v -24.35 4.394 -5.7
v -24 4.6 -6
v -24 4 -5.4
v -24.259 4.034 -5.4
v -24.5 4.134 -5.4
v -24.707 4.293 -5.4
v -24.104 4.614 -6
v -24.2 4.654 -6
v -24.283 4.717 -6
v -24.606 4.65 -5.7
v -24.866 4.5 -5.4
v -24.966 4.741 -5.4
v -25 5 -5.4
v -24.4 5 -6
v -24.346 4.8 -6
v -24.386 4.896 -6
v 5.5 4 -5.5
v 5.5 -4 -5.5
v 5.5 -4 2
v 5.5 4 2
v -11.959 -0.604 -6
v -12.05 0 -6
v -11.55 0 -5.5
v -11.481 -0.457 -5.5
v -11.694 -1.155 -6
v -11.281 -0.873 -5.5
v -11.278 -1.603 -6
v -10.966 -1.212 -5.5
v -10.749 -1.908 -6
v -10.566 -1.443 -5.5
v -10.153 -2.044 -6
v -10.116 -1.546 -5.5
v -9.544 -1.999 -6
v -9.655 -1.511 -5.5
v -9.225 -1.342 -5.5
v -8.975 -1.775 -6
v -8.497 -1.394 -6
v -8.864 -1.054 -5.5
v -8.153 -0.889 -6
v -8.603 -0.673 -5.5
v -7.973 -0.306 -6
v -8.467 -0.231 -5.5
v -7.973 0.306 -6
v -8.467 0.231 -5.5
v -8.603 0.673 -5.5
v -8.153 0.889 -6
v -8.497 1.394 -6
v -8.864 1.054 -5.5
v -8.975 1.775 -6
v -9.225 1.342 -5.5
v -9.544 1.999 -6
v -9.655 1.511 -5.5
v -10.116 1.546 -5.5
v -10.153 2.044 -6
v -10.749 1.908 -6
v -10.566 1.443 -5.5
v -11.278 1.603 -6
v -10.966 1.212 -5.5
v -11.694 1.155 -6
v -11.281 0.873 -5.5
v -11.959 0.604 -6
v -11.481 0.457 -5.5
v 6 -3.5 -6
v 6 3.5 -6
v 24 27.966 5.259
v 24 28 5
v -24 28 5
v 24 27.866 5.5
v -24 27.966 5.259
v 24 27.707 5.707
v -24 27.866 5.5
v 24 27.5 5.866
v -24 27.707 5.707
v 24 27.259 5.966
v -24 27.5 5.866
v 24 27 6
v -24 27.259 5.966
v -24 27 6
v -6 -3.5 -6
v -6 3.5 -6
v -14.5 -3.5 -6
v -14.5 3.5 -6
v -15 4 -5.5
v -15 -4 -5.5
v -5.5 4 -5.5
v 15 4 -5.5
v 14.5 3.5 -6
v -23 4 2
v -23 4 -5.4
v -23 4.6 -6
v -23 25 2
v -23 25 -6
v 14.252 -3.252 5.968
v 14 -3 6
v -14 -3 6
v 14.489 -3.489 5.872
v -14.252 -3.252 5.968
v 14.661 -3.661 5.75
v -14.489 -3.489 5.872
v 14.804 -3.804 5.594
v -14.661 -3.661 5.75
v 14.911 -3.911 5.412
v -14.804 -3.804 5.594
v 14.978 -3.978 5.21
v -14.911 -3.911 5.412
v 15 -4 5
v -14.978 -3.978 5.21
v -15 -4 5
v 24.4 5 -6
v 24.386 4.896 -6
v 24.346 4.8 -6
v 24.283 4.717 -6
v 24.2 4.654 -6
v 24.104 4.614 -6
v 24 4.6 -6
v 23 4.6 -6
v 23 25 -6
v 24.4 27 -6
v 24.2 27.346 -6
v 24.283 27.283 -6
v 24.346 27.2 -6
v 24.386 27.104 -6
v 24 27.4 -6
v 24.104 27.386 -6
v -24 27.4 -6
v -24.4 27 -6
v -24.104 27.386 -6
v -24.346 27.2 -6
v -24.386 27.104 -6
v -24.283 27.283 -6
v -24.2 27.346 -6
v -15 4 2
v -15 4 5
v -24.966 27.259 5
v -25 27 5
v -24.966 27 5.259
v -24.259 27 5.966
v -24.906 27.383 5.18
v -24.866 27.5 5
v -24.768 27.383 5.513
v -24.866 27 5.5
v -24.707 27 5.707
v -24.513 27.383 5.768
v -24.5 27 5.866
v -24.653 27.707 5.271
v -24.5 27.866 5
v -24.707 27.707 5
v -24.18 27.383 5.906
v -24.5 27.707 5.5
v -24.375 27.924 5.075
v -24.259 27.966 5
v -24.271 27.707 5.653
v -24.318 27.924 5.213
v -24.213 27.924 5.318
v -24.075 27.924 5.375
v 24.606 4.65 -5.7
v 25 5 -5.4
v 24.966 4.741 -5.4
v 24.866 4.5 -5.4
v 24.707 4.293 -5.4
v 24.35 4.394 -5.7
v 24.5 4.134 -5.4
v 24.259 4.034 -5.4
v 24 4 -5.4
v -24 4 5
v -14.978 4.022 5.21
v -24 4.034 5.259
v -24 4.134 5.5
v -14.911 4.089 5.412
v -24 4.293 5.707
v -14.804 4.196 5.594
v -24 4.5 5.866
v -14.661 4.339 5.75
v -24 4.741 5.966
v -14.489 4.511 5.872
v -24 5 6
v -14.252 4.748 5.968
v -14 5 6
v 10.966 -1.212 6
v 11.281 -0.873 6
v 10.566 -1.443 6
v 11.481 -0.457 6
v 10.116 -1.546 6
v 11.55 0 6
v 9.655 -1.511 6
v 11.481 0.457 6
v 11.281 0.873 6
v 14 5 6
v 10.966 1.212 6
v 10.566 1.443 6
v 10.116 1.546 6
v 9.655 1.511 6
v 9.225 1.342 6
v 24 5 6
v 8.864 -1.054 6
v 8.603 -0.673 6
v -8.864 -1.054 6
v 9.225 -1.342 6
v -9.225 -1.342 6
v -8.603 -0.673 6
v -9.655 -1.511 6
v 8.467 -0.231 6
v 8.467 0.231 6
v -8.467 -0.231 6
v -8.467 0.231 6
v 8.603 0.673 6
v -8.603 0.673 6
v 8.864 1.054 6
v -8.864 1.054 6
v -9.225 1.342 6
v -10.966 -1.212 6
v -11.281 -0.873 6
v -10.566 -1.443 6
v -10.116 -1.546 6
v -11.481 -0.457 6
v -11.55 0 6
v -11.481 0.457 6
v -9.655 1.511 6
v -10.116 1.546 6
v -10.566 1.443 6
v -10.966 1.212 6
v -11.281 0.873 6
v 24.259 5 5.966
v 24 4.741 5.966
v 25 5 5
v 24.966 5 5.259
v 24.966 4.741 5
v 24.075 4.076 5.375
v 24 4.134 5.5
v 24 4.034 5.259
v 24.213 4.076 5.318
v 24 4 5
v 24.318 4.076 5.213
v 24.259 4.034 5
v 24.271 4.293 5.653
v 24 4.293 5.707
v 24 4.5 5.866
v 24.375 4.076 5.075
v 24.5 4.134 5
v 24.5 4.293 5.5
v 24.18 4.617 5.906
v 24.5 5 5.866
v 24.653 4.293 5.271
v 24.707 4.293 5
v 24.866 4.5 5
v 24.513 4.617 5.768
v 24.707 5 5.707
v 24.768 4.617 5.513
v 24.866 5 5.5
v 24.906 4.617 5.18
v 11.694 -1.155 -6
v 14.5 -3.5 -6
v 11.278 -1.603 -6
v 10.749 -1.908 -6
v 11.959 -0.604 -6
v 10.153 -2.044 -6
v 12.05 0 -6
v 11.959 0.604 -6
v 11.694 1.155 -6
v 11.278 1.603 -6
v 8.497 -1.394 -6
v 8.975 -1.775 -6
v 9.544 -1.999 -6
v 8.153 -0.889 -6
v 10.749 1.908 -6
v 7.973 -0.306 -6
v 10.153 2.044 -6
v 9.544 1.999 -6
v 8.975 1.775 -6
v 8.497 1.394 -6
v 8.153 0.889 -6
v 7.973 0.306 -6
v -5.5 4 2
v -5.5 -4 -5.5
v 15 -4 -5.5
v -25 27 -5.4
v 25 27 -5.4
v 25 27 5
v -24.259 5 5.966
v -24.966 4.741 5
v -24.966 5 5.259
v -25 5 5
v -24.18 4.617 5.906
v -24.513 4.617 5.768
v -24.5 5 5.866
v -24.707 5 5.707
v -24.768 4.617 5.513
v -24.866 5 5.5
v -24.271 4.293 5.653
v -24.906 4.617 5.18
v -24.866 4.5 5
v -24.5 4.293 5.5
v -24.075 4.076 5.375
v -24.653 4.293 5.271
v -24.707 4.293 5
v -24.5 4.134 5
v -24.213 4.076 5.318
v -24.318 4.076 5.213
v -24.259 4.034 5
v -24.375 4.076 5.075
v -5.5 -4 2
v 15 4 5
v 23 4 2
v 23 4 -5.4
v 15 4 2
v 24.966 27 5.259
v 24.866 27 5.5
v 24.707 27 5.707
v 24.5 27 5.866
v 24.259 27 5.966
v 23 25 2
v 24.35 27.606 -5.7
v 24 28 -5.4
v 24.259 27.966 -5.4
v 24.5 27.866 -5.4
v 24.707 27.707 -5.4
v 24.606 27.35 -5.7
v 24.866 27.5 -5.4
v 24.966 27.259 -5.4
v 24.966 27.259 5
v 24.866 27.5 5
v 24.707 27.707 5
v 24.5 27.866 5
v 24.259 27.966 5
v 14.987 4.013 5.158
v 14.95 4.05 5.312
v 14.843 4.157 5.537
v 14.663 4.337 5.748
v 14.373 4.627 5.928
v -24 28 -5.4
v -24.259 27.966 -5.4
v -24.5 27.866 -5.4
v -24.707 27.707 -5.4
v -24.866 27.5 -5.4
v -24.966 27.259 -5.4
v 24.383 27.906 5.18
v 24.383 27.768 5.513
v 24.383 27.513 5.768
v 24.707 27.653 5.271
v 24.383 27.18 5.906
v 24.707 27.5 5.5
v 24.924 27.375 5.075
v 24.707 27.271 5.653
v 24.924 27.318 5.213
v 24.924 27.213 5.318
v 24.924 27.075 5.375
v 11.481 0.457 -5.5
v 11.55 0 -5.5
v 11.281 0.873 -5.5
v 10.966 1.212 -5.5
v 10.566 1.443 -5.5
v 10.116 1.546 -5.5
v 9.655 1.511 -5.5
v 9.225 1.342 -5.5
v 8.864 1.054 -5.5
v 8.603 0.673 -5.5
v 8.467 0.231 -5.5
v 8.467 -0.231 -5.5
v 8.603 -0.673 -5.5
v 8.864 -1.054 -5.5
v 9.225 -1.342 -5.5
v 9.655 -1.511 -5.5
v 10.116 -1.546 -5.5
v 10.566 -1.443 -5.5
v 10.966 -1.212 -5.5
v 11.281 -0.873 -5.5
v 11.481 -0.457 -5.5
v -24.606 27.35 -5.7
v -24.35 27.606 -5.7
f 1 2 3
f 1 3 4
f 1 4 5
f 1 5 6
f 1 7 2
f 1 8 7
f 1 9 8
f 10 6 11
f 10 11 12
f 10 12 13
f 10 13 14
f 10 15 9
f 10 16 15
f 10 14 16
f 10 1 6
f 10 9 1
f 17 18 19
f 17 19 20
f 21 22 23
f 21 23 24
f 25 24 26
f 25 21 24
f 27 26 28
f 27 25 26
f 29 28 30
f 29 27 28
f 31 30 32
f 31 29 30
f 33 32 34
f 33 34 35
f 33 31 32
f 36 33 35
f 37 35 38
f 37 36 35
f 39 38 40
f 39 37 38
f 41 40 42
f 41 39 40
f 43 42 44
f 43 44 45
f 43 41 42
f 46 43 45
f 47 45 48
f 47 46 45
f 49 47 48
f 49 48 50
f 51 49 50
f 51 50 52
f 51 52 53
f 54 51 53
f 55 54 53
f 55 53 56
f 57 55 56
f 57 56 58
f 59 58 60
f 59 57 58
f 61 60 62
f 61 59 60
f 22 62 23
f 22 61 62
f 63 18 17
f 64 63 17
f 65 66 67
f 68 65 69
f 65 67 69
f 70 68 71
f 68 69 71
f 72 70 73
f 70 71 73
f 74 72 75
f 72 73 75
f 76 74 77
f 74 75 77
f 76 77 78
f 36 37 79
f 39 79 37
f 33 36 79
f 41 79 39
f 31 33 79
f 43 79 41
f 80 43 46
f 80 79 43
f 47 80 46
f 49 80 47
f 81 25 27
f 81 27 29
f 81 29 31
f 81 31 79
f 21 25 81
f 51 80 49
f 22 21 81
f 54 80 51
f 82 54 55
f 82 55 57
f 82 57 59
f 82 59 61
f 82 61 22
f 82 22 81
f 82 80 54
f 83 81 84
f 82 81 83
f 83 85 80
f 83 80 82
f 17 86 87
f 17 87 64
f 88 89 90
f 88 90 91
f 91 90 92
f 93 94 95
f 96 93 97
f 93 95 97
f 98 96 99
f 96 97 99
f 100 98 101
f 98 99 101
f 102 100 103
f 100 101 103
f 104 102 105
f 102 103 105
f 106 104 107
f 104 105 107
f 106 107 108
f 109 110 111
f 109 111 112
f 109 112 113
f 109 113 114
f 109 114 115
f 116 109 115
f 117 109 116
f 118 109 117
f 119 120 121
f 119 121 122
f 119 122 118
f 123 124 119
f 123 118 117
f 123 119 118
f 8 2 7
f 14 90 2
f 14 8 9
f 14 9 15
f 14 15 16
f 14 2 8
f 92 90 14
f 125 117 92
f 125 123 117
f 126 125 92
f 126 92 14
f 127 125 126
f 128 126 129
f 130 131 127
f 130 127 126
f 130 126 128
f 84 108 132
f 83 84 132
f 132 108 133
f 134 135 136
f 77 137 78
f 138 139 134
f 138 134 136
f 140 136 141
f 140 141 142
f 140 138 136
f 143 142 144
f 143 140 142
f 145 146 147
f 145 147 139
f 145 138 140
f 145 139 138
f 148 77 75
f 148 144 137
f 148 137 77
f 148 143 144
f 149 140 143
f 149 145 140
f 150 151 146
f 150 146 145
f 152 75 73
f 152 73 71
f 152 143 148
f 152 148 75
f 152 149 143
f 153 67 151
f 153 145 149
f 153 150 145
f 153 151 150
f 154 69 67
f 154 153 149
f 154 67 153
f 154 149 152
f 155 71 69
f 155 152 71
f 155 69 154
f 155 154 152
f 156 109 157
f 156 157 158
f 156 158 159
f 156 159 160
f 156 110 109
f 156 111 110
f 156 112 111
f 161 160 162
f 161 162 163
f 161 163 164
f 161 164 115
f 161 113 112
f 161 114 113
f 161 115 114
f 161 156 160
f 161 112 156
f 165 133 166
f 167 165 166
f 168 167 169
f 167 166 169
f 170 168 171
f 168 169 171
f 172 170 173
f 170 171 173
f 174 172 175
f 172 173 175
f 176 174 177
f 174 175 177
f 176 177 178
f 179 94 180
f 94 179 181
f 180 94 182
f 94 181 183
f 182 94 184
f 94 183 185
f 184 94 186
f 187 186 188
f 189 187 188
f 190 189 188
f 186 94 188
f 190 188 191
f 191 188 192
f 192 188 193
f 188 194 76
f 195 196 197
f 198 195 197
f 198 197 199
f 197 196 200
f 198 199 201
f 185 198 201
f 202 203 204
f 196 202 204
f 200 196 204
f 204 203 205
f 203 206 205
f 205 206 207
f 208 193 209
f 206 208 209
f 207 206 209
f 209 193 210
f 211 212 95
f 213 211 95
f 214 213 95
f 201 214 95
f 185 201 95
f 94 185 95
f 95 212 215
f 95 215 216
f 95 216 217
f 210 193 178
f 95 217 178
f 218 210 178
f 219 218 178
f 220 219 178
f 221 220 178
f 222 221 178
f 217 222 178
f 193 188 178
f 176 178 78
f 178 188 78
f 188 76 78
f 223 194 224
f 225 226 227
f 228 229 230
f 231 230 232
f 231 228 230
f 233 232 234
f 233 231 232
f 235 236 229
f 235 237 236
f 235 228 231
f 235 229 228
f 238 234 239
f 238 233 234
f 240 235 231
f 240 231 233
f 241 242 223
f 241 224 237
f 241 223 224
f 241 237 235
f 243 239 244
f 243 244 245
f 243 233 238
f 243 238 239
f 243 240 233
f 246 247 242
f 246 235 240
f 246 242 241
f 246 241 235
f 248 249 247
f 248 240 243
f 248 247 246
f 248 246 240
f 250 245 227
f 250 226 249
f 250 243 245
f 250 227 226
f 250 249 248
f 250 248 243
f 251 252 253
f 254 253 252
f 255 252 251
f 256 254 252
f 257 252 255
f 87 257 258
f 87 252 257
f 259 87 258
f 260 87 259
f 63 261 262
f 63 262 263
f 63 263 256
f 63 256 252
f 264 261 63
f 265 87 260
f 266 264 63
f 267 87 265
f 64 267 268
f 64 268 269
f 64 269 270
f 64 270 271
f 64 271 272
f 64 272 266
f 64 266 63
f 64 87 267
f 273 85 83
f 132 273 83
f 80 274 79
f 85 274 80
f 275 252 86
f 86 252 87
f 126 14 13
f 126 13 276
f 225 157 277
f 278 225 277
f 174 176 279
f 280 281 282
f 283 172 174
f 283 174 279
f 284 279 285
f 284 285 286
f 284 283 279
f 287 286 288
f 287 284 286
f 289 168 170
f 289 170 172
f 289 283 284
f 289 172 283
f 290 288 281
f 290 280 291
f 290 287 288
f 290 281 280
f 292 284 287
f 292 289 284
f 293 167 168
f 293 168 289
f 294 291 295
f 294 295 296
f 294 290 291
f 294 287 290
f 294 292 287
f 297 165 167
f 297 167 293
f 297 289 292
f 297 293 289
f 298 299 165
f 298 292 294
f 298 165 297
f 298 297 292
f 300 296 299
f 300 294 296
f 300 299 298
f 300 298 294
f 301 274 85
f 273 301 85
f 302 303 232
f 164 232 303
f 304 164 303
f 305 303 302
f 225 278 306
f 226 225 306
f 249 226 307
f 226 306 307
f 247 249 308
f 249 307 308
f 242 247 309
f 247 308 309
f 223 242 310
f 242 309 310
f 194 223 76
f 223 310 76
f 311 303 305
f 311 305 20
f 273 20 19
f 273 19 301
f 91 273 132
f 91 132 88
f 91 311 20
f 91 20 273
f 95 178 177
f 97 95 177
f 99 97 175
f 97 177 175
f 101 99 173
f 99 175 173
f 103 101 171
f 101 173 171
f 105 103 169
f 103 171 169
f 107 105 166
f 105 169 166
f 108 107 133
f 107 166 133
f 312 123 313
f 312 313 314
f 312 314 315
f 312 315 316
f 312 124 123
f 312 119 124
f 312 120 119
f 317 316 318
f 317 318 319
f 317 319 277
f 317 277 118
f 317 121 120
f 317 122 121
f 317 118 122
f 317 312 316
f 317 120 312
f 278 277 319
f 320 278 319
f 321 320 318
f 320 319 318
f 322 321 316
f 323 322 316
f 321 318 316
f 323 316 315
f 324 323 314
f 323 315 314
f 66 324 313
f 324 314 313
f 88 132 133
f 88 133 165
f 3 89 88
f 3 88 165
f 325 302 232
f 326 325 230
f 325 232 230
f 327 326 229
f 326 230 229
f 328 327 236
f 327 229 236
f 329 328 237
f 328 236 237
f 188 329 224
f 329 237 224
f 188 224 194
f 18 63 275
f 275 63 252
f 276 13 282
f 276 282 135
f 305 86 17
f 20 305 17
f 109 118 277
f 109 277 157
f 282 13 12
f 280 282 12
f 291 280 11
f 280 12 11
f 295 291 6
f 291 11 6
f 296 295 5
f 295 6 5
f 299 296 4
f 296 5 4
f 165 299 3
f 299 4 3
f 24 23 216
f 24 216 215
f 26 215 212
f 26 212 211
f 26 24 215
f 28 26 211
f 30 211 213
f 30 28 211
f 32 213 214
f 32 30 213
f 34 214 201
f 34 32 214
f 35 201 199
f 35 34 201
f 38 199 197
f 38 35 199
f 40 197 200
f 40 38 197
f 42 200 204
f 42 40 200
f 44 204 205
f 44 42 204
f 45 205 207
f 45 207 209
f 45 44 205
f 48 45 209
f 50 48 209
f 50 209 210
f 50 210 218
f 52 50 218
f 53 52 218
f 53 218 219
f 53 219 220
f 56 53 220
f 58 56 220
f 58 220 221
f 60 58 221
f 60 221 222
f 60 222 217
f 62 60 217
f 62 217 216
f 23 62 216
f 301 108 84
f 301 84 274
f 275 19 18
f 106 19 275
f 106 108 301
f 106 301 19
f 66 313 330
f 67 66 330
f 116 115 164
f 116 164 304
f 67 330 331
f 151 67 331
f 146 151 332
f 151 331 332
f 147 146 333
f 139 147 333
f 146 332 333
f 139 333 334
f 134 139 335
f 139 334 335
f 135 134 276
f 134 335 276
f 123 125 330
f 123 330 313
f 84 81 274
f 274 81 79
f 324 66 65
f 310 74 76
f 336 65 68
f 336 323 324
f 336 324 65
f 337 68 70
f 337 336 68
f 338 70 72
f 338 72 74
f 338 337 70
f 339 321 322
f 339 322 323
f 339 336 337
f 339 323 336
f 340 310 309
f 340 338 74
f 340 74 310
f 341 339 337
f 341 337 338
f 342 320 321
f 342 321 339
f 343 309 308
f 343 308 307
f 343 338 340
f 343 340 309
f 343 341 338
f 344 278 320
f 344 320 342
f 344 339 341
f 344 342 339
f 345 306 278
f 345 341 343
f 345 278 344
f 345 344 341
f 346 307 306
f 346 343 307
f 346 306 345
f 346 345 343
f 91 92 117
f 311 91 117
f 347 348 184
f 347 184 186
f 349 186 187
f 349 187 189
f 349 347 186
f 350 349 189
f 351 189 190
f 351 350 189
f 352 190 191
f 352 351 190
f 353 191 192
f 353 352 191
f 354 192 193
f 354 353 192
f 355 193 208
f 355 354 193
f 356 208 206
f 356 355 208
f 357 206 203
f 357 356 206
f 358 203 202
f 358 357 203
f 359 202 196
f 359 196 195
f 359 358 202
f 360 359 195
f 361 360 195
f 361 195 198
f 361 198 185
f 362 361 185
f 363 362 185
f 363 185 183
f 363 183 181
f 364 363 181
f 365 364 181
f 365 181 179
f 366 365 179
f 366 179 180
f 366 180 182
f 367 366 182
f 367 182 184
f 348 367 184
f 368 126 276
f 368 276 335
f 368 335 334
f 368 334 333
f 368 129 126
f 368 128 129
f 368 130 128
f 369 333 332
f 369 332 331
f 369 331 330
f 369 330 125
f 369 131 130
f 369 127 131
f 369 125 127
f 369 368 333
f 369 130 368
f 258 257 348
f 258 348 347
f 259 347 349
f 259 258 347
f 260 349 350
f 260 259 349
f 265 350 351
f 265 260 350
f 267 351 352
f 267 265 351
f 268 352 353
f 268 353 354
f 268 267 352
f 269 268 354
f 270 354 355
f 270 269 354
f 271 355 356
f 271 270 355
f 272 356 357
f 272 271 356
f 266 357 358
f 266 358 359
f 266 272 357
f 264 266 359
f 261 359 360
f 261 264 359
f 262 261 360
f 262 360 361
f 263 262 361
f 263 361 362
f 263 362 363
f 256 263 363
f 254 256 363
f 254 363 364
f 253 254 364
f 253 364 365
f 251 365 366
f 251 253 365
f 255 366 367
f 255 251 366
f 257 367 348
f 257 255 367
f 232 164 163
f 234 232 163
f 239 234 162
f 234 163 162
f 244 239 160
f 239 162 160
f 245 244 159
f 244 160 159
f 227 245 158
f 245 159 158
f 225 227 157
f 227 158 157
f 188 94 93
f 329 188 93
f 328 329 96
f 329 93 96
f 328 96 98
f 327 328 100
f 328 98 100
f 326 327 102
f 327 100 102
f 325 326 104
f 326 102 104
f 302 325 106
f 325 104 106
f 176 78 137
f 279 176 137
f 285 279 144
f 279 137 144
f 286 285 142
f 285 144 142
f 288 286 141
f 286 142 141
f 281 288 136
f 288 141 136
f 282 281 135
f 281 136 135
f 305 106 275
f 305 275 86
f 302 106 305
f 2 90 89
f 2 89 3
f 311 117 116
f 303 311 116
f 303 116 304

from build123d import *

# Parameters (mm, degrees)
SKETCH1_W           = 30
SKETCH1_H           = 8
SKETCH1_R           = 1.55
BOSS_EXTRUDE1_DEPTH = 6
SKETCH6_W           = 50
SKETCH6_H           = 24
BOSS_EXTRUDE4_DEPTH = 12
SKETCH8_W           = 11
SKETCH8_H           = 8
CUT_EXTRUDE2_DEPTH  = 8
FILLET1_R           = 1
FILLET2_R           = 1
CHAMFER2_SIZE       = 0.6
CHAMFER3_SIZE       = 0.5


with BuildPart() as part:
    # Sketch1 → Boss-Extrude1 (new, symmetric)
    with BuildSketch(Plane.XY):
        Rectangle(SKETCH1_W, SKETCH1_H)
        with Locations((10, 0)):
            Circle(SKETCH1_R, mode=Mode.SUBTRACT)
        with Locations(Location((-10, 0, 0), (0, 0, 180))):
            Circle(SKETCH1_R, mode=Mode.SUBTRACT)
    extrude(amount=BOSS_EXTRUDE1_DEPTH, both=True)

    # Sketch6 → Boss-Extrude4 (add)
    with BuildSketch(Plane(origin=(0, 0, -6), x_dir=(-1, 0, 0), z_dir=(0, 0, -1))):
        with Locations((0, 16)):
            Rectangle(SKETCH6_W, SKETCH6_H)
    extrude(amount=-BOSS_EXTRUDE4_DEPTH)

    # Sketch8 → Cut-Extrude2 (cut)
    with BuildSketch(Plane(origin=(0, 0, -6), x_dir=(-1, 0, 0), z_dir=(0, 0, -1))):
        Rectangle(SKETCH8_W, SKETCH8_H)
        Polygon((-23, 25), (-23, 4), (-15, 4), (-5.5, 4), (5.5, 4), (15, 4), (23, 4), (23, 25), align=None)
    extrude(amount=-CUT_EXTRUDE2_DEPTH, mode=Mode.SUBTRACT)

    # Fillet1
    fillet1_edges = [part.edges().sort_by_distance(p)[0] for p in [
        (25, 16, 6),
        (0, 28, 6),
        (-25, 16, 6),
    ]]
    fillet(fillet1_edges, radius=FILLET1_R)

    # Fillet2
    # the kernel refuses this fillet: 1 mm, written as the material it takes off along each edge
    with BuildSketch(Plane(origin=(24, 27, 5), x_dir=(0, 1, 0), z_dir=(1, 0, 0))) as fillet2_piece_1_section:
        Polygon((0, 0), (FILLET2_R, 0), (FILLET2_R, FILLET2_R), (0, FILLET2_R), align=None)
    fillet2_piece_1 = extrude(amount=FILLET2_R, mode=Mode.PRIVATE)
    fillet2_piece_1 = fillet2_piece_1 - Plane(origin=(24, 27, 5), x_dir=(0, -0.7071067811865475, -0.7071067811865475), z_dir=(1, 0, 0)) * Sphere(FILLET2_R, mode=Mode.PRIVATE)
    add(fillet2_piece_1, mode=Mode.SUBTRACT)
    with BuildSketch(Plane(origin=(-24, 27, 5), x_dir=(-1, 0, 0), z_dir=(0, 1, 0))) as fillet2_piece_2_section:
        Polygon((0, 0), (FILLET2_R, 0), (FILLET2_R, FILLET2_R), (0, FILLET2_R), align=None)
    fillet2_piece_2 = extrude(amount=FILLET2_R, mode=Mode.PRIVATE)
    fillet2_piece_2 = fillet2_piece_2 - Plane(origin=(-24, 27, 5), x_dir=(0.7071067811865475, 0, -0.7071067811865475), z_dir=(0, 1, 0)) * Sphere(FILLET2_R, mode=Mode.PRIVATE)
    add(fillet2_piece_2, mode=Mode.SUBTRACT)
    with BuildSketch(Plane(origin=(-15, 4, 6), x_dir=(1, 0, 0), z_dir=(0, -1, 0)), Plane(origin=(15, -6.5, 6), x_dir=(-1, 0, 0), z_dir=(0, 1, 0))) as fillet2_piece_3:
        with BuildLine():
            CenterArc((FILLET2_R, -FILLET2_R), FILLET2_R, 90, 90)
            Line((0, -FILLET2_R), (0, 0))
            Line((0, 0), (FILLET2_R, 0))
        make_face()
    extrude(amount=10.5, mode=Mode.SUBTRACT)
    with BuildSketch(Plane(origin=(-17.5, -4, 6), x_dir=(0, 1, 0), z_dir=(1, 0, 0))) as fillet2_piece_4:
        with BuildLine():
            CenterArc((FILLET2_R, -FILLET2_R), FILLET2_R, 90, 90)
            Line((0, -FILLET2_R), (0, 0))
            Line((0, 0), (FILLET2_R, 0))
        make_face()
    extrude(amount=35, mode=Mode.SUBTRACT)
    with BuildSketch(Plane(origin=(24, 4, 6), x_dir=(0, 0, -1), z_dir=(-1, 0, 0))) as fillet2_piece_5:
        with BuildLine():
            CenterArc((FILLET2_R, -FILLET2_R), FILLET2_R, 90, 90)
            Line((0, -FILLET2_R), (0, 0))
            Line((0, 0), (FILLET2_R, 0))
        make_face()
    extrude(amount=9, mode=Mode.SUBTRACT)
    with BuildSketch(Plane(origin=(-15, 4, 6), x_dir=(0, 1, 0), z_dir=(-1, 0, 0))) as fillet2_piece_6:
        with BuildLine():
            CenterArc((FILLET2_R, FILLET2_R), FILLET2_R, 180, 90)
            Line((0, FILLET2_R), (0, 0))
            Line((0, 0), (FILLET2_R, 0))
        make_face()
    extrude(amount=9, mode=Mode.SUBTRACT)
    with BuildSketch(Plane(origin=(-25, 4, -8.5), x_dir=(1, 0, 0), z_dir=(0, 0, 1))) as fillet2_piece_7:
        with BuildLine():
            CenterArc((FILLET2_R, FILLET2_R), FILLET2_R, 180, 90)
            Line((0, FILLET2_R), (0, 0))
            Line((0, 0), (FILLET2_R, 0))
        make_face()
    extrude(amount=13.5, mode=Mode.SUBTRACT)
    with BuildSketch(Plane(origin=(-24, 4, 5), x_dir=(0, 0, 1), z_dir=(1, 0, 0))) as fillet2_piece_8:
        with BuildLine():
            CenterArc((1 - FILLET2_R, -FILLET2_R), FILLET2_R, 0, 90)
            Line((1 - FILLET2_R, 0), (1, 0))
            Line((1, 0), (1, -FILLET2_R))
        make_face()
    revolve(axis=Axis((-24, 4, 5), (0, -1, 0)), revolution_arc=90, mode=Mode.SUBTRACT)
    with BuildSketch(Plane(origin=(-25, 28, -8.5), x_dir=(1, 0, 0), z_dir=(0, 0, 1)), Plane(origin=(25, 4, -8.5), x_dir=(-1, 0, 0), z_dir=(0, 0, 1)), Plane(origin=(25, 28, -8.5), x_dir=(0, -1, 0), z_dir=(0, 0, 1))) as fillet2_piece_9:
        with BuildLine():
            CenterArc((FILLET2_R, -FILLET2_R), FILLET2_R, 90, 90)
            Line((0, -FILLET2_R), (0, 0))
            Line((0, 0), (FILLET2_R, 0))
        make_face()
    extrude(amount=13.5, mode=Mode.SUBTRACT)
    with BuildSketch(Plane(origin=(24, 4, 5), x_dir=(0, 0, 1), z_dir=(-1, 0, 0))) as fillet2_piece_10:
        with BuildLine():
            CenterArc((1 - FILLET2_R, FILLET2_R), FILLET2_R, 270, 90)
            Line((1, FILLET2_R), (1, 0))
            Line((1, 0), (1 - FILLET2_R, 0))
        make_face()
    revolve(axis=Axis((24, 4, 5), (0, 1, 0)), revolution_arc=90, mode=Mode.SUBTRACT)
    with BuildSketch(Plane(origin=(-15, 6.5, 6), x_dir=(1, 0, 0), z_dir=(0, -1, 0))) as fillet2_piece_11a_section:
        with BuildLine():
            CenterArc((FILLET2_R, -FILLET2_R), FILLET2_R, 90, 90)
            Line((0, -FILLET2_R), (0, 0))
            Line((0, 0), (FILLET2_R, 0))
        make_face()
    fillet2_piece_11a = extrude(amount=13, mode=Mode.PRIVATE)
    fillet2_piece_11a = split(fillet2_piece_11a, bisect_by=Plane(origin=(-14.773604886, 4, 5.773604886), z_dir=(0, 1, 0)), keep=Keep.TOP, mode=Mode.PRIVATE)
    with BuildSketch(Plane(origin=(-12.5, 4, 6), x_dir=(0, 1, 0), z_dir=(-1, 0, 0))) as fillet2_piece_11b_section:
        with BuildLine():
            CenterArc((FILLET2_R, FILLET2_R), FILLET2_R, 180, 90)
            Line((0, FILLET2_R), (0, 0))
            Line((0, 0), (FILLET2_R, 0))
        make_face()
    fillet2_piece_11b = extrude(amount=11.5, mode=Mode.PRIVATE)
    fillet2_piece_11b = split(fillet2_piece_11b, bisect_by=Plane(origin=(-15, 4.226395114, 5.773604886), z_dir=(1, 0, 0)), keep=Keep.TOP, mode=Mode.PRIVATE)
    fillet2_piece_11 = fillet2_piece_11a & fillet2_piece_11b
    add(fillet2_piece_11, mode=Mode.SUBTRACT)
    with BuildSketch(Plane(origin=(24, 4, 6), x_dir=(0, 0, -1), z_dir=(-1, 0, 0))) as fillet2_piece_12a_section:
        with BuildLine():
            CenterArc((FILLET2_R, -FILLET2_R), FILLET2_R, 90, 90)
            Line((0, -FILLET2_R), (0, 0))
            Line((0, 0), (FILLET2_R, 0))
        make_face()
    fillet2_piece_12a = extrude(amount=11.5, mode=Mode.PRIVATE)
    fillet2_piece_12a = split(fillet2_piece_12a, bisect_by=Plane(origin=(15, 4.226395114, 5.773604886), z_dir=(-1, 0, 0)), keep=Keep.TOP, mode=Mode.PRIVATE)
    with BuildSketch(Plane(origin=(15, -6.5, 6), x_dir=(-1, 0, 0), z_dir=(0, 1, 0))) as fillet2_piece_12b_section:
        with BuildLine():
            CenterArc((FILLET2_R, -FILLET2_R), FILLET2_R, 90, 90)
            Line((0, -FILLET2_R), (0, 0))
            Line((0, 0), (FILLET2_R, 0))
        make_face()
    fillet2_piece_12b = extrude(amount=13, mode=Mode.PRIVATE)
    fillet2_piece_12b = split(fillet2_piece_12b, bisect_by=Plane(origin=(14.773604886, 4, 5.773604886), z_dir=(0, 1, 0)), keep=Keep.TOP, mode=Mode.PRIVATE)
    fillet2_piece_12 = fillet2_piece_12a & fillet2_piece_12b
    add(fillet2_piece_12, mode=Mode.SUBTRACT)

    # Chamfer2
    chamfer2_edges = [part.edges().sort_by_distance(p)[0] for p in [
        (-25, 16, -6),
        (0, 28, -6),
        (25, 16, -6),
        (24.707106781, 27.707106781, -6),
        (-24.707106781, 27.707106781, -6),
        (24.707106781, 4.292893219, -6),
        (-24.707106781, 4.292893219, -6),
        (-23.5, 4, -6),
        (23.5, 4, -6),
    ]]
    chamfer(chamfer2_edges, length=CHAMFER2_SIZE)

    # Chamfer3
    chamfer3_edges = [part.edges().sort_by_distance(p)[0] for p in [
        (8.45, 0, -6),
        (-8.45, 0, -6),
        (10.25, -4, -6),
        (-5.5, 0, -6),
        (-10.25, -4, -6),
        (-15, 0, -6),
        (-10.25, 4, -6),
        (10.25, 4, -6),
        (5.5, 0, -6),
        (15, 0, -6),
    ]]
    chamfer(chamfer3_edges, length=CHAMFER3_SIZE)


solid = part.part
